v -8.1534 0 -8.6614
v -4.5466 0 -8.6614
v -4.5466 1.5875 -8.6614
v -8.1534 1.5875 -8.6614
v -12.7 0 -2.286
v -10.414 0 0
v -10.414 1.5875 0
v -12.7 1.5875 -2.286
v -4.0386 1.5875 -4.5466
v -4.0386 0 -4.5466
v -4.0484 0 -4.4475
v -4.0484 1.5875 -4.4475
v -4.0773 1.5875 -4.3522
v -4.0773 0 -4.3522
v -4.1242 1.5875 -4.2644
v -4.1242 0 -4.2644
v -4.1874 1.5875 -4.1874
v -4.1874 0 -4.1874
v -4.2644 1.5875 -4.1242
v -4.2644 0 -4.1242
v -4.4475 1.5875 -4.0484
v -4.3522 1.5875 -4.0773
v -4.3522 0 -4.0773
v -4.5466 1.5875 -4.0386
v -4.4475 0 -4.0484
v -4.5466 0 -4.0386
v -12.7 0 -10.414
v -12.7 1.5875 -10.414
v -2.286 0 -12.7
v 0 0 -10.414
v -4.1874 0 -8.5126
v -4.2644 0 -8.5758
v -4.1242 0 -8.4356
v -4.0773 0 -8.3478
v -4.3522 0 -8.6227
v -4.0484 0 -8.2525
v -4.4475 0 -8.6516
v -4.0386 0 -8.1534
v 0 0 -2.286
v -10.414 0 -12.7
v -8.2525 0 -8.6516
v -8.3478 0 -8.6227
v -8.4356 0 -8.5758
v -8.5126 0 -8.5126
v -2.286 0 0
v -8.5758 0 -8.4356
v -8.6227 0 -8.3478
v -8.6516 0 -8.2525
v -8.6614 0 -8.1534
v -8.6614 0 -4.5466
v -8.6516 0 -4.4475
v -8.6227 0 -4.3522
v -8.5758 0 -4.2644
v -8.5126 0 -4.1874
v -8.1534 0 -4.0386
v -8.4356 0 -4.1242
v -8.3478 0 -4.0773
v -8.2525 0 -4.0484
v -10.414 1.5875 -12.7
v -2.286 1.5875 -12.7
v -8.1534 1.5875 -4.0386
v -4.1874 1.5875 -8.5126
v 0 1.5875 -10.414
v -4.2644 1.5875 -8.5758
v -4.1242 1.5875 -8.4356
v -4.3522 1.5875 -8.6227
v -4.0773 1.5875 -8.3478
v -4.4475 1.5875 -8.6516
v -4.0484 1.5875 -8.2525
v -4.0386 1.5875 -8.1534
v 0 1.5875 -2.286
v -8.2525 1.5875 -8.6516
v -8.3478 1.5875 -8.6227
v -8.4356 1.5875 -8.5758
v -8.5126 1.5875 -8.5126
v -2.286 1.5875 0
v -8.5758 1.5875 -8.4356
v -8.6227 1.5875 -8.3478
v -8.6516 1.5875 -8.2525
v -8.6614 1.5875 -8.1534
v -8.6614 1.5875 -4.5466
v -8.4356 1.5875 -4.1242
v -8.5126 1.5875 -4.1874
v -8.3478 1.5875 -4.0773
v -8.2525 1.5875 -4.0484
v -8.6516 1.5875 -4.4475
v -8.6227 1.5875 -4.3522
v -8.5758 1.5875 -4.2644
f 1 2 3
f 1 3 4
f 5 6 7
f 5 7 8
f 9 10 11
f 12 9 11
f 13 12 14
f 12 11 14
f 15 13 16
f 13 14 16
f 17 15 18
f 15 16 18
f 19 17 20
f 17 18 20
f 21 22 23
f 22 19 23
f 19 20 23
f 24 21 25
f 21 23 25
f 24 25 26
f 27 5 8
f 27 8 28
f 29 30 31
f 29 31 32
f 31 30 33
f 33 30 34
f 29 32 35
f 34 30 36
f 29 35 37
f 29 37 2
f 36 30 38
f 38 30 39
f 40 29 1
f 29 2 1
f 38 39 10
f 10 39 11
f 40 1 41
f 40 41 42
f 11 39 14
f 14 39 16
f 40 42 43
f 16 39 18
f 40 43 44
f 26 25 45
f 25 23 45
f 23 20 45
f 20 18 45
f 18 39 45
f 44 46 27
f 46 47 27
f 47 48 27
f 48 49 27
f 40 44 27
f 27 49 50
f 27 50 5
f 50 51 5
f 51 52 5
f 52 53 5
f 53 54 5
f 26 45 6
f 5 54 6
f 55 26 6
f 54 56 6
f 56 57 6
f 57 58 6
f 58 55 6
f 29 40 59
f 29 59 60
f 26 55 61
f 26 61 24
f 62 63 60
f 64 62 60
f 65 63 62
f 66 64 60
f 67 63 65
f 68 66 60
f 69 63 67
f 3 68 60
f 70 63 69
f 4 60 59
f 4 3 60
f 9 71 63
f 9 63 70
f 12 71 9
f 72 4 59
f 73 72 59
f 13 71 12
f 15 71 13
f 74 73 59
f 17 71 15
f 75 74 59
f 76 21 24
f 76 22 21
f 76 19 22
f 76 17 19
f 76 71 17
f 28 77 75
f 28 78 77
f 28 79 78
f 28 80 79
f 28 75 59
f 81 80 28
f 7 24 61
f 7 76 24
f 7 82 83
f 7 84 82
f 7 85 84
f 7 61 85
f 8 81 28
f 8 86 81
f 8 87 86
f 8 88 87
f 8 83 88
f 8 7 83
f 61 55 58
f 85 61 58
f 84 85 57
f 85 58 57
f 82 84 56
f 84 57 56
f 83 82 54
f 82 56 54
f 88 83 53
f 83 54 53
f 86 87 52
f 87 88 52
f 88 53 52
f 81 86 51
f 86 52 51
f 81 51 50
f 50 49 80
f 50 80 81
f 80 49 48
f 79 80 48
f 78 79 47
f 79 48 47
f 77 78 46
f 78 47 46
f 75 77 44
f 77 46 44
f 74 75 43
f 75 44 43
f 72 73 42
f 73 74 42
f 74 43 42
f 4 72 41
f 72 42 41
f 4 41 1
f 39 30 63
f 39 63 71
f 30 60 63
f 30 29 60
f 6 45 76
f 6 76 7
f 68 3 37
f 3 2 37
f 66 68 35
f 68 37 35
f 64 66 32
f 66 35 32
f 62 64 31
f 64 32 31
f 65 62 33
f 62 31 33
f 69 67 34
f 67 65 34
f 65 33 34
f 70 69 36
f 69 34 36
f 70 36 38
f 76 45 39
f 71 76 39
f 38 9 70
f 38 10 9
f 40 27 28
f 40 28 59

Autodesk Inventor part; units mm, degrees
ref_plane "YZ Plane" through (0, 0, 0) normal (1, 0, 0) x (0, 1, 0)
ref_plane "XZ Plane" through (0, 0, 0) normal (0, 1, 0) x (-1, 0, 0)
ref_plane "XY Plane" through (0, 0, 0) normal (0, 0, 1) x (1, 0, 0)
sketch "Sketch1" plane through (0, 0, 0) normal (0, 1, 0) x (-1, 0, 0)
  line L0 (2.286, 0) -> (10.414, 0)
  line L1 (12.7, -2.286) -> (12.7, -10.414)
  line L2 (10.414, -12.7) -> (2.286, -12.7)
  line L3 (0, -10.414) -> (0, -2.286)
  line L4 (8.1534, -4.0386) -> (4.5466, -4.0386)
  line L5 (4.0386, -4.5466) -> (4.0386, -8.1534)
  line L6 (4.5466, -8.6614) -> (8.1534, -8.6614)
  line L7 (8.6614, -8.1534) -> (8.6614, -4.5466)
  line L8 (10.414, 0) -> (12.7, -2.286)
  line L9 (12.7, -10.414) -> (10.414, -12.7)
  line L10 (2.286, -12.7) -> (0, -10.414)
  line L11 (2.286, 0) -> (0, -2.286)
  arc A0 (8.6614, -4.5466) -> (8.1534, -4.0386) centre (8.1534, -4.5466) ccw
  arc A1 (8.1534, -8.6614) -> (8.6614, -8.1534) centre (8.1534, -8.1534) ccw
  arc A2 (4.0386, -8.1534) -> (4.5466, -8.6614) centre (4.5466, -8.1534) ccw
  arc A3 (4.5466, -4.0386) -> (4.0386, -4.5466) centre (4.5466, -4.5466) ccw
  line L12 (8.1534, -4.5466) -> (4.5466, -8.1534) construction
  line L13 (12.7, -10.414) -> (0, -2.286) construction
  point P0 (0, 0)
  point P1 (12.7, -12.7)
  point P2 (12.7, 0)
  point P3 (0, -12.7)
  point P4 (4.0386, -8.6614)
  point P5 (8.6614, -8.6614)
  point P6 (6.35, -6.35)
  dimension "d1" = 12.7
  dimension "d2" = 4.6228
  dimension "d3" = 2.286
  dimension "d4" = 2.286
  dimension "d5" = 2.286
  dimension "d6" = 2.286
  dimension "d7" = 2.286
  dimension "d8" = 2.286
  dimension "d9" = 2.286
  dimension "d10" = 2.286
  dimension "d11" = 0.508
extrude "Body" add sketch "Sketch1" along normal blind 1.5875
sketch "Sketch2" plane through (0, 1.5875, 0) normal (0, 1, 0) x (1, 0, 0)
  arc A0 (-8.1534, 8.6614) -> (-8.6614, 8.1534) centre (-8.1534, 8.1534) ccw construction
  arc A1 (-4.5466, 4.0386) -> (-4.0386, 4.5466) centre (-4.5466, 4.5466) ccw construction
  circle A2 centre (-6.35, 6.35) radius 2.1844
  line L0 (-8.1534, 8.1534) -> (-4.5466, 4.5466) construction
  point P0 (0, 0)
  dimension "d14" = 4.3688
surface extrude "Circle" sketch "Sketch2" against normal up to surface (1.5875 mm away) shown yes curves A2
pattern_of_one "Rectangular Pattern1"
equation "\"d4\" = d3"
equation "\"d5\" = d3"
equation "\"d6\" = d5"
equation "\"d7\" = d3"
equation "\"d8\" = d7"
equation "\"d9\" = d3"
equation "\"d10\" = d9"
equation "\"d22\" = d19"
equation "\"d19\" = 12.7"
